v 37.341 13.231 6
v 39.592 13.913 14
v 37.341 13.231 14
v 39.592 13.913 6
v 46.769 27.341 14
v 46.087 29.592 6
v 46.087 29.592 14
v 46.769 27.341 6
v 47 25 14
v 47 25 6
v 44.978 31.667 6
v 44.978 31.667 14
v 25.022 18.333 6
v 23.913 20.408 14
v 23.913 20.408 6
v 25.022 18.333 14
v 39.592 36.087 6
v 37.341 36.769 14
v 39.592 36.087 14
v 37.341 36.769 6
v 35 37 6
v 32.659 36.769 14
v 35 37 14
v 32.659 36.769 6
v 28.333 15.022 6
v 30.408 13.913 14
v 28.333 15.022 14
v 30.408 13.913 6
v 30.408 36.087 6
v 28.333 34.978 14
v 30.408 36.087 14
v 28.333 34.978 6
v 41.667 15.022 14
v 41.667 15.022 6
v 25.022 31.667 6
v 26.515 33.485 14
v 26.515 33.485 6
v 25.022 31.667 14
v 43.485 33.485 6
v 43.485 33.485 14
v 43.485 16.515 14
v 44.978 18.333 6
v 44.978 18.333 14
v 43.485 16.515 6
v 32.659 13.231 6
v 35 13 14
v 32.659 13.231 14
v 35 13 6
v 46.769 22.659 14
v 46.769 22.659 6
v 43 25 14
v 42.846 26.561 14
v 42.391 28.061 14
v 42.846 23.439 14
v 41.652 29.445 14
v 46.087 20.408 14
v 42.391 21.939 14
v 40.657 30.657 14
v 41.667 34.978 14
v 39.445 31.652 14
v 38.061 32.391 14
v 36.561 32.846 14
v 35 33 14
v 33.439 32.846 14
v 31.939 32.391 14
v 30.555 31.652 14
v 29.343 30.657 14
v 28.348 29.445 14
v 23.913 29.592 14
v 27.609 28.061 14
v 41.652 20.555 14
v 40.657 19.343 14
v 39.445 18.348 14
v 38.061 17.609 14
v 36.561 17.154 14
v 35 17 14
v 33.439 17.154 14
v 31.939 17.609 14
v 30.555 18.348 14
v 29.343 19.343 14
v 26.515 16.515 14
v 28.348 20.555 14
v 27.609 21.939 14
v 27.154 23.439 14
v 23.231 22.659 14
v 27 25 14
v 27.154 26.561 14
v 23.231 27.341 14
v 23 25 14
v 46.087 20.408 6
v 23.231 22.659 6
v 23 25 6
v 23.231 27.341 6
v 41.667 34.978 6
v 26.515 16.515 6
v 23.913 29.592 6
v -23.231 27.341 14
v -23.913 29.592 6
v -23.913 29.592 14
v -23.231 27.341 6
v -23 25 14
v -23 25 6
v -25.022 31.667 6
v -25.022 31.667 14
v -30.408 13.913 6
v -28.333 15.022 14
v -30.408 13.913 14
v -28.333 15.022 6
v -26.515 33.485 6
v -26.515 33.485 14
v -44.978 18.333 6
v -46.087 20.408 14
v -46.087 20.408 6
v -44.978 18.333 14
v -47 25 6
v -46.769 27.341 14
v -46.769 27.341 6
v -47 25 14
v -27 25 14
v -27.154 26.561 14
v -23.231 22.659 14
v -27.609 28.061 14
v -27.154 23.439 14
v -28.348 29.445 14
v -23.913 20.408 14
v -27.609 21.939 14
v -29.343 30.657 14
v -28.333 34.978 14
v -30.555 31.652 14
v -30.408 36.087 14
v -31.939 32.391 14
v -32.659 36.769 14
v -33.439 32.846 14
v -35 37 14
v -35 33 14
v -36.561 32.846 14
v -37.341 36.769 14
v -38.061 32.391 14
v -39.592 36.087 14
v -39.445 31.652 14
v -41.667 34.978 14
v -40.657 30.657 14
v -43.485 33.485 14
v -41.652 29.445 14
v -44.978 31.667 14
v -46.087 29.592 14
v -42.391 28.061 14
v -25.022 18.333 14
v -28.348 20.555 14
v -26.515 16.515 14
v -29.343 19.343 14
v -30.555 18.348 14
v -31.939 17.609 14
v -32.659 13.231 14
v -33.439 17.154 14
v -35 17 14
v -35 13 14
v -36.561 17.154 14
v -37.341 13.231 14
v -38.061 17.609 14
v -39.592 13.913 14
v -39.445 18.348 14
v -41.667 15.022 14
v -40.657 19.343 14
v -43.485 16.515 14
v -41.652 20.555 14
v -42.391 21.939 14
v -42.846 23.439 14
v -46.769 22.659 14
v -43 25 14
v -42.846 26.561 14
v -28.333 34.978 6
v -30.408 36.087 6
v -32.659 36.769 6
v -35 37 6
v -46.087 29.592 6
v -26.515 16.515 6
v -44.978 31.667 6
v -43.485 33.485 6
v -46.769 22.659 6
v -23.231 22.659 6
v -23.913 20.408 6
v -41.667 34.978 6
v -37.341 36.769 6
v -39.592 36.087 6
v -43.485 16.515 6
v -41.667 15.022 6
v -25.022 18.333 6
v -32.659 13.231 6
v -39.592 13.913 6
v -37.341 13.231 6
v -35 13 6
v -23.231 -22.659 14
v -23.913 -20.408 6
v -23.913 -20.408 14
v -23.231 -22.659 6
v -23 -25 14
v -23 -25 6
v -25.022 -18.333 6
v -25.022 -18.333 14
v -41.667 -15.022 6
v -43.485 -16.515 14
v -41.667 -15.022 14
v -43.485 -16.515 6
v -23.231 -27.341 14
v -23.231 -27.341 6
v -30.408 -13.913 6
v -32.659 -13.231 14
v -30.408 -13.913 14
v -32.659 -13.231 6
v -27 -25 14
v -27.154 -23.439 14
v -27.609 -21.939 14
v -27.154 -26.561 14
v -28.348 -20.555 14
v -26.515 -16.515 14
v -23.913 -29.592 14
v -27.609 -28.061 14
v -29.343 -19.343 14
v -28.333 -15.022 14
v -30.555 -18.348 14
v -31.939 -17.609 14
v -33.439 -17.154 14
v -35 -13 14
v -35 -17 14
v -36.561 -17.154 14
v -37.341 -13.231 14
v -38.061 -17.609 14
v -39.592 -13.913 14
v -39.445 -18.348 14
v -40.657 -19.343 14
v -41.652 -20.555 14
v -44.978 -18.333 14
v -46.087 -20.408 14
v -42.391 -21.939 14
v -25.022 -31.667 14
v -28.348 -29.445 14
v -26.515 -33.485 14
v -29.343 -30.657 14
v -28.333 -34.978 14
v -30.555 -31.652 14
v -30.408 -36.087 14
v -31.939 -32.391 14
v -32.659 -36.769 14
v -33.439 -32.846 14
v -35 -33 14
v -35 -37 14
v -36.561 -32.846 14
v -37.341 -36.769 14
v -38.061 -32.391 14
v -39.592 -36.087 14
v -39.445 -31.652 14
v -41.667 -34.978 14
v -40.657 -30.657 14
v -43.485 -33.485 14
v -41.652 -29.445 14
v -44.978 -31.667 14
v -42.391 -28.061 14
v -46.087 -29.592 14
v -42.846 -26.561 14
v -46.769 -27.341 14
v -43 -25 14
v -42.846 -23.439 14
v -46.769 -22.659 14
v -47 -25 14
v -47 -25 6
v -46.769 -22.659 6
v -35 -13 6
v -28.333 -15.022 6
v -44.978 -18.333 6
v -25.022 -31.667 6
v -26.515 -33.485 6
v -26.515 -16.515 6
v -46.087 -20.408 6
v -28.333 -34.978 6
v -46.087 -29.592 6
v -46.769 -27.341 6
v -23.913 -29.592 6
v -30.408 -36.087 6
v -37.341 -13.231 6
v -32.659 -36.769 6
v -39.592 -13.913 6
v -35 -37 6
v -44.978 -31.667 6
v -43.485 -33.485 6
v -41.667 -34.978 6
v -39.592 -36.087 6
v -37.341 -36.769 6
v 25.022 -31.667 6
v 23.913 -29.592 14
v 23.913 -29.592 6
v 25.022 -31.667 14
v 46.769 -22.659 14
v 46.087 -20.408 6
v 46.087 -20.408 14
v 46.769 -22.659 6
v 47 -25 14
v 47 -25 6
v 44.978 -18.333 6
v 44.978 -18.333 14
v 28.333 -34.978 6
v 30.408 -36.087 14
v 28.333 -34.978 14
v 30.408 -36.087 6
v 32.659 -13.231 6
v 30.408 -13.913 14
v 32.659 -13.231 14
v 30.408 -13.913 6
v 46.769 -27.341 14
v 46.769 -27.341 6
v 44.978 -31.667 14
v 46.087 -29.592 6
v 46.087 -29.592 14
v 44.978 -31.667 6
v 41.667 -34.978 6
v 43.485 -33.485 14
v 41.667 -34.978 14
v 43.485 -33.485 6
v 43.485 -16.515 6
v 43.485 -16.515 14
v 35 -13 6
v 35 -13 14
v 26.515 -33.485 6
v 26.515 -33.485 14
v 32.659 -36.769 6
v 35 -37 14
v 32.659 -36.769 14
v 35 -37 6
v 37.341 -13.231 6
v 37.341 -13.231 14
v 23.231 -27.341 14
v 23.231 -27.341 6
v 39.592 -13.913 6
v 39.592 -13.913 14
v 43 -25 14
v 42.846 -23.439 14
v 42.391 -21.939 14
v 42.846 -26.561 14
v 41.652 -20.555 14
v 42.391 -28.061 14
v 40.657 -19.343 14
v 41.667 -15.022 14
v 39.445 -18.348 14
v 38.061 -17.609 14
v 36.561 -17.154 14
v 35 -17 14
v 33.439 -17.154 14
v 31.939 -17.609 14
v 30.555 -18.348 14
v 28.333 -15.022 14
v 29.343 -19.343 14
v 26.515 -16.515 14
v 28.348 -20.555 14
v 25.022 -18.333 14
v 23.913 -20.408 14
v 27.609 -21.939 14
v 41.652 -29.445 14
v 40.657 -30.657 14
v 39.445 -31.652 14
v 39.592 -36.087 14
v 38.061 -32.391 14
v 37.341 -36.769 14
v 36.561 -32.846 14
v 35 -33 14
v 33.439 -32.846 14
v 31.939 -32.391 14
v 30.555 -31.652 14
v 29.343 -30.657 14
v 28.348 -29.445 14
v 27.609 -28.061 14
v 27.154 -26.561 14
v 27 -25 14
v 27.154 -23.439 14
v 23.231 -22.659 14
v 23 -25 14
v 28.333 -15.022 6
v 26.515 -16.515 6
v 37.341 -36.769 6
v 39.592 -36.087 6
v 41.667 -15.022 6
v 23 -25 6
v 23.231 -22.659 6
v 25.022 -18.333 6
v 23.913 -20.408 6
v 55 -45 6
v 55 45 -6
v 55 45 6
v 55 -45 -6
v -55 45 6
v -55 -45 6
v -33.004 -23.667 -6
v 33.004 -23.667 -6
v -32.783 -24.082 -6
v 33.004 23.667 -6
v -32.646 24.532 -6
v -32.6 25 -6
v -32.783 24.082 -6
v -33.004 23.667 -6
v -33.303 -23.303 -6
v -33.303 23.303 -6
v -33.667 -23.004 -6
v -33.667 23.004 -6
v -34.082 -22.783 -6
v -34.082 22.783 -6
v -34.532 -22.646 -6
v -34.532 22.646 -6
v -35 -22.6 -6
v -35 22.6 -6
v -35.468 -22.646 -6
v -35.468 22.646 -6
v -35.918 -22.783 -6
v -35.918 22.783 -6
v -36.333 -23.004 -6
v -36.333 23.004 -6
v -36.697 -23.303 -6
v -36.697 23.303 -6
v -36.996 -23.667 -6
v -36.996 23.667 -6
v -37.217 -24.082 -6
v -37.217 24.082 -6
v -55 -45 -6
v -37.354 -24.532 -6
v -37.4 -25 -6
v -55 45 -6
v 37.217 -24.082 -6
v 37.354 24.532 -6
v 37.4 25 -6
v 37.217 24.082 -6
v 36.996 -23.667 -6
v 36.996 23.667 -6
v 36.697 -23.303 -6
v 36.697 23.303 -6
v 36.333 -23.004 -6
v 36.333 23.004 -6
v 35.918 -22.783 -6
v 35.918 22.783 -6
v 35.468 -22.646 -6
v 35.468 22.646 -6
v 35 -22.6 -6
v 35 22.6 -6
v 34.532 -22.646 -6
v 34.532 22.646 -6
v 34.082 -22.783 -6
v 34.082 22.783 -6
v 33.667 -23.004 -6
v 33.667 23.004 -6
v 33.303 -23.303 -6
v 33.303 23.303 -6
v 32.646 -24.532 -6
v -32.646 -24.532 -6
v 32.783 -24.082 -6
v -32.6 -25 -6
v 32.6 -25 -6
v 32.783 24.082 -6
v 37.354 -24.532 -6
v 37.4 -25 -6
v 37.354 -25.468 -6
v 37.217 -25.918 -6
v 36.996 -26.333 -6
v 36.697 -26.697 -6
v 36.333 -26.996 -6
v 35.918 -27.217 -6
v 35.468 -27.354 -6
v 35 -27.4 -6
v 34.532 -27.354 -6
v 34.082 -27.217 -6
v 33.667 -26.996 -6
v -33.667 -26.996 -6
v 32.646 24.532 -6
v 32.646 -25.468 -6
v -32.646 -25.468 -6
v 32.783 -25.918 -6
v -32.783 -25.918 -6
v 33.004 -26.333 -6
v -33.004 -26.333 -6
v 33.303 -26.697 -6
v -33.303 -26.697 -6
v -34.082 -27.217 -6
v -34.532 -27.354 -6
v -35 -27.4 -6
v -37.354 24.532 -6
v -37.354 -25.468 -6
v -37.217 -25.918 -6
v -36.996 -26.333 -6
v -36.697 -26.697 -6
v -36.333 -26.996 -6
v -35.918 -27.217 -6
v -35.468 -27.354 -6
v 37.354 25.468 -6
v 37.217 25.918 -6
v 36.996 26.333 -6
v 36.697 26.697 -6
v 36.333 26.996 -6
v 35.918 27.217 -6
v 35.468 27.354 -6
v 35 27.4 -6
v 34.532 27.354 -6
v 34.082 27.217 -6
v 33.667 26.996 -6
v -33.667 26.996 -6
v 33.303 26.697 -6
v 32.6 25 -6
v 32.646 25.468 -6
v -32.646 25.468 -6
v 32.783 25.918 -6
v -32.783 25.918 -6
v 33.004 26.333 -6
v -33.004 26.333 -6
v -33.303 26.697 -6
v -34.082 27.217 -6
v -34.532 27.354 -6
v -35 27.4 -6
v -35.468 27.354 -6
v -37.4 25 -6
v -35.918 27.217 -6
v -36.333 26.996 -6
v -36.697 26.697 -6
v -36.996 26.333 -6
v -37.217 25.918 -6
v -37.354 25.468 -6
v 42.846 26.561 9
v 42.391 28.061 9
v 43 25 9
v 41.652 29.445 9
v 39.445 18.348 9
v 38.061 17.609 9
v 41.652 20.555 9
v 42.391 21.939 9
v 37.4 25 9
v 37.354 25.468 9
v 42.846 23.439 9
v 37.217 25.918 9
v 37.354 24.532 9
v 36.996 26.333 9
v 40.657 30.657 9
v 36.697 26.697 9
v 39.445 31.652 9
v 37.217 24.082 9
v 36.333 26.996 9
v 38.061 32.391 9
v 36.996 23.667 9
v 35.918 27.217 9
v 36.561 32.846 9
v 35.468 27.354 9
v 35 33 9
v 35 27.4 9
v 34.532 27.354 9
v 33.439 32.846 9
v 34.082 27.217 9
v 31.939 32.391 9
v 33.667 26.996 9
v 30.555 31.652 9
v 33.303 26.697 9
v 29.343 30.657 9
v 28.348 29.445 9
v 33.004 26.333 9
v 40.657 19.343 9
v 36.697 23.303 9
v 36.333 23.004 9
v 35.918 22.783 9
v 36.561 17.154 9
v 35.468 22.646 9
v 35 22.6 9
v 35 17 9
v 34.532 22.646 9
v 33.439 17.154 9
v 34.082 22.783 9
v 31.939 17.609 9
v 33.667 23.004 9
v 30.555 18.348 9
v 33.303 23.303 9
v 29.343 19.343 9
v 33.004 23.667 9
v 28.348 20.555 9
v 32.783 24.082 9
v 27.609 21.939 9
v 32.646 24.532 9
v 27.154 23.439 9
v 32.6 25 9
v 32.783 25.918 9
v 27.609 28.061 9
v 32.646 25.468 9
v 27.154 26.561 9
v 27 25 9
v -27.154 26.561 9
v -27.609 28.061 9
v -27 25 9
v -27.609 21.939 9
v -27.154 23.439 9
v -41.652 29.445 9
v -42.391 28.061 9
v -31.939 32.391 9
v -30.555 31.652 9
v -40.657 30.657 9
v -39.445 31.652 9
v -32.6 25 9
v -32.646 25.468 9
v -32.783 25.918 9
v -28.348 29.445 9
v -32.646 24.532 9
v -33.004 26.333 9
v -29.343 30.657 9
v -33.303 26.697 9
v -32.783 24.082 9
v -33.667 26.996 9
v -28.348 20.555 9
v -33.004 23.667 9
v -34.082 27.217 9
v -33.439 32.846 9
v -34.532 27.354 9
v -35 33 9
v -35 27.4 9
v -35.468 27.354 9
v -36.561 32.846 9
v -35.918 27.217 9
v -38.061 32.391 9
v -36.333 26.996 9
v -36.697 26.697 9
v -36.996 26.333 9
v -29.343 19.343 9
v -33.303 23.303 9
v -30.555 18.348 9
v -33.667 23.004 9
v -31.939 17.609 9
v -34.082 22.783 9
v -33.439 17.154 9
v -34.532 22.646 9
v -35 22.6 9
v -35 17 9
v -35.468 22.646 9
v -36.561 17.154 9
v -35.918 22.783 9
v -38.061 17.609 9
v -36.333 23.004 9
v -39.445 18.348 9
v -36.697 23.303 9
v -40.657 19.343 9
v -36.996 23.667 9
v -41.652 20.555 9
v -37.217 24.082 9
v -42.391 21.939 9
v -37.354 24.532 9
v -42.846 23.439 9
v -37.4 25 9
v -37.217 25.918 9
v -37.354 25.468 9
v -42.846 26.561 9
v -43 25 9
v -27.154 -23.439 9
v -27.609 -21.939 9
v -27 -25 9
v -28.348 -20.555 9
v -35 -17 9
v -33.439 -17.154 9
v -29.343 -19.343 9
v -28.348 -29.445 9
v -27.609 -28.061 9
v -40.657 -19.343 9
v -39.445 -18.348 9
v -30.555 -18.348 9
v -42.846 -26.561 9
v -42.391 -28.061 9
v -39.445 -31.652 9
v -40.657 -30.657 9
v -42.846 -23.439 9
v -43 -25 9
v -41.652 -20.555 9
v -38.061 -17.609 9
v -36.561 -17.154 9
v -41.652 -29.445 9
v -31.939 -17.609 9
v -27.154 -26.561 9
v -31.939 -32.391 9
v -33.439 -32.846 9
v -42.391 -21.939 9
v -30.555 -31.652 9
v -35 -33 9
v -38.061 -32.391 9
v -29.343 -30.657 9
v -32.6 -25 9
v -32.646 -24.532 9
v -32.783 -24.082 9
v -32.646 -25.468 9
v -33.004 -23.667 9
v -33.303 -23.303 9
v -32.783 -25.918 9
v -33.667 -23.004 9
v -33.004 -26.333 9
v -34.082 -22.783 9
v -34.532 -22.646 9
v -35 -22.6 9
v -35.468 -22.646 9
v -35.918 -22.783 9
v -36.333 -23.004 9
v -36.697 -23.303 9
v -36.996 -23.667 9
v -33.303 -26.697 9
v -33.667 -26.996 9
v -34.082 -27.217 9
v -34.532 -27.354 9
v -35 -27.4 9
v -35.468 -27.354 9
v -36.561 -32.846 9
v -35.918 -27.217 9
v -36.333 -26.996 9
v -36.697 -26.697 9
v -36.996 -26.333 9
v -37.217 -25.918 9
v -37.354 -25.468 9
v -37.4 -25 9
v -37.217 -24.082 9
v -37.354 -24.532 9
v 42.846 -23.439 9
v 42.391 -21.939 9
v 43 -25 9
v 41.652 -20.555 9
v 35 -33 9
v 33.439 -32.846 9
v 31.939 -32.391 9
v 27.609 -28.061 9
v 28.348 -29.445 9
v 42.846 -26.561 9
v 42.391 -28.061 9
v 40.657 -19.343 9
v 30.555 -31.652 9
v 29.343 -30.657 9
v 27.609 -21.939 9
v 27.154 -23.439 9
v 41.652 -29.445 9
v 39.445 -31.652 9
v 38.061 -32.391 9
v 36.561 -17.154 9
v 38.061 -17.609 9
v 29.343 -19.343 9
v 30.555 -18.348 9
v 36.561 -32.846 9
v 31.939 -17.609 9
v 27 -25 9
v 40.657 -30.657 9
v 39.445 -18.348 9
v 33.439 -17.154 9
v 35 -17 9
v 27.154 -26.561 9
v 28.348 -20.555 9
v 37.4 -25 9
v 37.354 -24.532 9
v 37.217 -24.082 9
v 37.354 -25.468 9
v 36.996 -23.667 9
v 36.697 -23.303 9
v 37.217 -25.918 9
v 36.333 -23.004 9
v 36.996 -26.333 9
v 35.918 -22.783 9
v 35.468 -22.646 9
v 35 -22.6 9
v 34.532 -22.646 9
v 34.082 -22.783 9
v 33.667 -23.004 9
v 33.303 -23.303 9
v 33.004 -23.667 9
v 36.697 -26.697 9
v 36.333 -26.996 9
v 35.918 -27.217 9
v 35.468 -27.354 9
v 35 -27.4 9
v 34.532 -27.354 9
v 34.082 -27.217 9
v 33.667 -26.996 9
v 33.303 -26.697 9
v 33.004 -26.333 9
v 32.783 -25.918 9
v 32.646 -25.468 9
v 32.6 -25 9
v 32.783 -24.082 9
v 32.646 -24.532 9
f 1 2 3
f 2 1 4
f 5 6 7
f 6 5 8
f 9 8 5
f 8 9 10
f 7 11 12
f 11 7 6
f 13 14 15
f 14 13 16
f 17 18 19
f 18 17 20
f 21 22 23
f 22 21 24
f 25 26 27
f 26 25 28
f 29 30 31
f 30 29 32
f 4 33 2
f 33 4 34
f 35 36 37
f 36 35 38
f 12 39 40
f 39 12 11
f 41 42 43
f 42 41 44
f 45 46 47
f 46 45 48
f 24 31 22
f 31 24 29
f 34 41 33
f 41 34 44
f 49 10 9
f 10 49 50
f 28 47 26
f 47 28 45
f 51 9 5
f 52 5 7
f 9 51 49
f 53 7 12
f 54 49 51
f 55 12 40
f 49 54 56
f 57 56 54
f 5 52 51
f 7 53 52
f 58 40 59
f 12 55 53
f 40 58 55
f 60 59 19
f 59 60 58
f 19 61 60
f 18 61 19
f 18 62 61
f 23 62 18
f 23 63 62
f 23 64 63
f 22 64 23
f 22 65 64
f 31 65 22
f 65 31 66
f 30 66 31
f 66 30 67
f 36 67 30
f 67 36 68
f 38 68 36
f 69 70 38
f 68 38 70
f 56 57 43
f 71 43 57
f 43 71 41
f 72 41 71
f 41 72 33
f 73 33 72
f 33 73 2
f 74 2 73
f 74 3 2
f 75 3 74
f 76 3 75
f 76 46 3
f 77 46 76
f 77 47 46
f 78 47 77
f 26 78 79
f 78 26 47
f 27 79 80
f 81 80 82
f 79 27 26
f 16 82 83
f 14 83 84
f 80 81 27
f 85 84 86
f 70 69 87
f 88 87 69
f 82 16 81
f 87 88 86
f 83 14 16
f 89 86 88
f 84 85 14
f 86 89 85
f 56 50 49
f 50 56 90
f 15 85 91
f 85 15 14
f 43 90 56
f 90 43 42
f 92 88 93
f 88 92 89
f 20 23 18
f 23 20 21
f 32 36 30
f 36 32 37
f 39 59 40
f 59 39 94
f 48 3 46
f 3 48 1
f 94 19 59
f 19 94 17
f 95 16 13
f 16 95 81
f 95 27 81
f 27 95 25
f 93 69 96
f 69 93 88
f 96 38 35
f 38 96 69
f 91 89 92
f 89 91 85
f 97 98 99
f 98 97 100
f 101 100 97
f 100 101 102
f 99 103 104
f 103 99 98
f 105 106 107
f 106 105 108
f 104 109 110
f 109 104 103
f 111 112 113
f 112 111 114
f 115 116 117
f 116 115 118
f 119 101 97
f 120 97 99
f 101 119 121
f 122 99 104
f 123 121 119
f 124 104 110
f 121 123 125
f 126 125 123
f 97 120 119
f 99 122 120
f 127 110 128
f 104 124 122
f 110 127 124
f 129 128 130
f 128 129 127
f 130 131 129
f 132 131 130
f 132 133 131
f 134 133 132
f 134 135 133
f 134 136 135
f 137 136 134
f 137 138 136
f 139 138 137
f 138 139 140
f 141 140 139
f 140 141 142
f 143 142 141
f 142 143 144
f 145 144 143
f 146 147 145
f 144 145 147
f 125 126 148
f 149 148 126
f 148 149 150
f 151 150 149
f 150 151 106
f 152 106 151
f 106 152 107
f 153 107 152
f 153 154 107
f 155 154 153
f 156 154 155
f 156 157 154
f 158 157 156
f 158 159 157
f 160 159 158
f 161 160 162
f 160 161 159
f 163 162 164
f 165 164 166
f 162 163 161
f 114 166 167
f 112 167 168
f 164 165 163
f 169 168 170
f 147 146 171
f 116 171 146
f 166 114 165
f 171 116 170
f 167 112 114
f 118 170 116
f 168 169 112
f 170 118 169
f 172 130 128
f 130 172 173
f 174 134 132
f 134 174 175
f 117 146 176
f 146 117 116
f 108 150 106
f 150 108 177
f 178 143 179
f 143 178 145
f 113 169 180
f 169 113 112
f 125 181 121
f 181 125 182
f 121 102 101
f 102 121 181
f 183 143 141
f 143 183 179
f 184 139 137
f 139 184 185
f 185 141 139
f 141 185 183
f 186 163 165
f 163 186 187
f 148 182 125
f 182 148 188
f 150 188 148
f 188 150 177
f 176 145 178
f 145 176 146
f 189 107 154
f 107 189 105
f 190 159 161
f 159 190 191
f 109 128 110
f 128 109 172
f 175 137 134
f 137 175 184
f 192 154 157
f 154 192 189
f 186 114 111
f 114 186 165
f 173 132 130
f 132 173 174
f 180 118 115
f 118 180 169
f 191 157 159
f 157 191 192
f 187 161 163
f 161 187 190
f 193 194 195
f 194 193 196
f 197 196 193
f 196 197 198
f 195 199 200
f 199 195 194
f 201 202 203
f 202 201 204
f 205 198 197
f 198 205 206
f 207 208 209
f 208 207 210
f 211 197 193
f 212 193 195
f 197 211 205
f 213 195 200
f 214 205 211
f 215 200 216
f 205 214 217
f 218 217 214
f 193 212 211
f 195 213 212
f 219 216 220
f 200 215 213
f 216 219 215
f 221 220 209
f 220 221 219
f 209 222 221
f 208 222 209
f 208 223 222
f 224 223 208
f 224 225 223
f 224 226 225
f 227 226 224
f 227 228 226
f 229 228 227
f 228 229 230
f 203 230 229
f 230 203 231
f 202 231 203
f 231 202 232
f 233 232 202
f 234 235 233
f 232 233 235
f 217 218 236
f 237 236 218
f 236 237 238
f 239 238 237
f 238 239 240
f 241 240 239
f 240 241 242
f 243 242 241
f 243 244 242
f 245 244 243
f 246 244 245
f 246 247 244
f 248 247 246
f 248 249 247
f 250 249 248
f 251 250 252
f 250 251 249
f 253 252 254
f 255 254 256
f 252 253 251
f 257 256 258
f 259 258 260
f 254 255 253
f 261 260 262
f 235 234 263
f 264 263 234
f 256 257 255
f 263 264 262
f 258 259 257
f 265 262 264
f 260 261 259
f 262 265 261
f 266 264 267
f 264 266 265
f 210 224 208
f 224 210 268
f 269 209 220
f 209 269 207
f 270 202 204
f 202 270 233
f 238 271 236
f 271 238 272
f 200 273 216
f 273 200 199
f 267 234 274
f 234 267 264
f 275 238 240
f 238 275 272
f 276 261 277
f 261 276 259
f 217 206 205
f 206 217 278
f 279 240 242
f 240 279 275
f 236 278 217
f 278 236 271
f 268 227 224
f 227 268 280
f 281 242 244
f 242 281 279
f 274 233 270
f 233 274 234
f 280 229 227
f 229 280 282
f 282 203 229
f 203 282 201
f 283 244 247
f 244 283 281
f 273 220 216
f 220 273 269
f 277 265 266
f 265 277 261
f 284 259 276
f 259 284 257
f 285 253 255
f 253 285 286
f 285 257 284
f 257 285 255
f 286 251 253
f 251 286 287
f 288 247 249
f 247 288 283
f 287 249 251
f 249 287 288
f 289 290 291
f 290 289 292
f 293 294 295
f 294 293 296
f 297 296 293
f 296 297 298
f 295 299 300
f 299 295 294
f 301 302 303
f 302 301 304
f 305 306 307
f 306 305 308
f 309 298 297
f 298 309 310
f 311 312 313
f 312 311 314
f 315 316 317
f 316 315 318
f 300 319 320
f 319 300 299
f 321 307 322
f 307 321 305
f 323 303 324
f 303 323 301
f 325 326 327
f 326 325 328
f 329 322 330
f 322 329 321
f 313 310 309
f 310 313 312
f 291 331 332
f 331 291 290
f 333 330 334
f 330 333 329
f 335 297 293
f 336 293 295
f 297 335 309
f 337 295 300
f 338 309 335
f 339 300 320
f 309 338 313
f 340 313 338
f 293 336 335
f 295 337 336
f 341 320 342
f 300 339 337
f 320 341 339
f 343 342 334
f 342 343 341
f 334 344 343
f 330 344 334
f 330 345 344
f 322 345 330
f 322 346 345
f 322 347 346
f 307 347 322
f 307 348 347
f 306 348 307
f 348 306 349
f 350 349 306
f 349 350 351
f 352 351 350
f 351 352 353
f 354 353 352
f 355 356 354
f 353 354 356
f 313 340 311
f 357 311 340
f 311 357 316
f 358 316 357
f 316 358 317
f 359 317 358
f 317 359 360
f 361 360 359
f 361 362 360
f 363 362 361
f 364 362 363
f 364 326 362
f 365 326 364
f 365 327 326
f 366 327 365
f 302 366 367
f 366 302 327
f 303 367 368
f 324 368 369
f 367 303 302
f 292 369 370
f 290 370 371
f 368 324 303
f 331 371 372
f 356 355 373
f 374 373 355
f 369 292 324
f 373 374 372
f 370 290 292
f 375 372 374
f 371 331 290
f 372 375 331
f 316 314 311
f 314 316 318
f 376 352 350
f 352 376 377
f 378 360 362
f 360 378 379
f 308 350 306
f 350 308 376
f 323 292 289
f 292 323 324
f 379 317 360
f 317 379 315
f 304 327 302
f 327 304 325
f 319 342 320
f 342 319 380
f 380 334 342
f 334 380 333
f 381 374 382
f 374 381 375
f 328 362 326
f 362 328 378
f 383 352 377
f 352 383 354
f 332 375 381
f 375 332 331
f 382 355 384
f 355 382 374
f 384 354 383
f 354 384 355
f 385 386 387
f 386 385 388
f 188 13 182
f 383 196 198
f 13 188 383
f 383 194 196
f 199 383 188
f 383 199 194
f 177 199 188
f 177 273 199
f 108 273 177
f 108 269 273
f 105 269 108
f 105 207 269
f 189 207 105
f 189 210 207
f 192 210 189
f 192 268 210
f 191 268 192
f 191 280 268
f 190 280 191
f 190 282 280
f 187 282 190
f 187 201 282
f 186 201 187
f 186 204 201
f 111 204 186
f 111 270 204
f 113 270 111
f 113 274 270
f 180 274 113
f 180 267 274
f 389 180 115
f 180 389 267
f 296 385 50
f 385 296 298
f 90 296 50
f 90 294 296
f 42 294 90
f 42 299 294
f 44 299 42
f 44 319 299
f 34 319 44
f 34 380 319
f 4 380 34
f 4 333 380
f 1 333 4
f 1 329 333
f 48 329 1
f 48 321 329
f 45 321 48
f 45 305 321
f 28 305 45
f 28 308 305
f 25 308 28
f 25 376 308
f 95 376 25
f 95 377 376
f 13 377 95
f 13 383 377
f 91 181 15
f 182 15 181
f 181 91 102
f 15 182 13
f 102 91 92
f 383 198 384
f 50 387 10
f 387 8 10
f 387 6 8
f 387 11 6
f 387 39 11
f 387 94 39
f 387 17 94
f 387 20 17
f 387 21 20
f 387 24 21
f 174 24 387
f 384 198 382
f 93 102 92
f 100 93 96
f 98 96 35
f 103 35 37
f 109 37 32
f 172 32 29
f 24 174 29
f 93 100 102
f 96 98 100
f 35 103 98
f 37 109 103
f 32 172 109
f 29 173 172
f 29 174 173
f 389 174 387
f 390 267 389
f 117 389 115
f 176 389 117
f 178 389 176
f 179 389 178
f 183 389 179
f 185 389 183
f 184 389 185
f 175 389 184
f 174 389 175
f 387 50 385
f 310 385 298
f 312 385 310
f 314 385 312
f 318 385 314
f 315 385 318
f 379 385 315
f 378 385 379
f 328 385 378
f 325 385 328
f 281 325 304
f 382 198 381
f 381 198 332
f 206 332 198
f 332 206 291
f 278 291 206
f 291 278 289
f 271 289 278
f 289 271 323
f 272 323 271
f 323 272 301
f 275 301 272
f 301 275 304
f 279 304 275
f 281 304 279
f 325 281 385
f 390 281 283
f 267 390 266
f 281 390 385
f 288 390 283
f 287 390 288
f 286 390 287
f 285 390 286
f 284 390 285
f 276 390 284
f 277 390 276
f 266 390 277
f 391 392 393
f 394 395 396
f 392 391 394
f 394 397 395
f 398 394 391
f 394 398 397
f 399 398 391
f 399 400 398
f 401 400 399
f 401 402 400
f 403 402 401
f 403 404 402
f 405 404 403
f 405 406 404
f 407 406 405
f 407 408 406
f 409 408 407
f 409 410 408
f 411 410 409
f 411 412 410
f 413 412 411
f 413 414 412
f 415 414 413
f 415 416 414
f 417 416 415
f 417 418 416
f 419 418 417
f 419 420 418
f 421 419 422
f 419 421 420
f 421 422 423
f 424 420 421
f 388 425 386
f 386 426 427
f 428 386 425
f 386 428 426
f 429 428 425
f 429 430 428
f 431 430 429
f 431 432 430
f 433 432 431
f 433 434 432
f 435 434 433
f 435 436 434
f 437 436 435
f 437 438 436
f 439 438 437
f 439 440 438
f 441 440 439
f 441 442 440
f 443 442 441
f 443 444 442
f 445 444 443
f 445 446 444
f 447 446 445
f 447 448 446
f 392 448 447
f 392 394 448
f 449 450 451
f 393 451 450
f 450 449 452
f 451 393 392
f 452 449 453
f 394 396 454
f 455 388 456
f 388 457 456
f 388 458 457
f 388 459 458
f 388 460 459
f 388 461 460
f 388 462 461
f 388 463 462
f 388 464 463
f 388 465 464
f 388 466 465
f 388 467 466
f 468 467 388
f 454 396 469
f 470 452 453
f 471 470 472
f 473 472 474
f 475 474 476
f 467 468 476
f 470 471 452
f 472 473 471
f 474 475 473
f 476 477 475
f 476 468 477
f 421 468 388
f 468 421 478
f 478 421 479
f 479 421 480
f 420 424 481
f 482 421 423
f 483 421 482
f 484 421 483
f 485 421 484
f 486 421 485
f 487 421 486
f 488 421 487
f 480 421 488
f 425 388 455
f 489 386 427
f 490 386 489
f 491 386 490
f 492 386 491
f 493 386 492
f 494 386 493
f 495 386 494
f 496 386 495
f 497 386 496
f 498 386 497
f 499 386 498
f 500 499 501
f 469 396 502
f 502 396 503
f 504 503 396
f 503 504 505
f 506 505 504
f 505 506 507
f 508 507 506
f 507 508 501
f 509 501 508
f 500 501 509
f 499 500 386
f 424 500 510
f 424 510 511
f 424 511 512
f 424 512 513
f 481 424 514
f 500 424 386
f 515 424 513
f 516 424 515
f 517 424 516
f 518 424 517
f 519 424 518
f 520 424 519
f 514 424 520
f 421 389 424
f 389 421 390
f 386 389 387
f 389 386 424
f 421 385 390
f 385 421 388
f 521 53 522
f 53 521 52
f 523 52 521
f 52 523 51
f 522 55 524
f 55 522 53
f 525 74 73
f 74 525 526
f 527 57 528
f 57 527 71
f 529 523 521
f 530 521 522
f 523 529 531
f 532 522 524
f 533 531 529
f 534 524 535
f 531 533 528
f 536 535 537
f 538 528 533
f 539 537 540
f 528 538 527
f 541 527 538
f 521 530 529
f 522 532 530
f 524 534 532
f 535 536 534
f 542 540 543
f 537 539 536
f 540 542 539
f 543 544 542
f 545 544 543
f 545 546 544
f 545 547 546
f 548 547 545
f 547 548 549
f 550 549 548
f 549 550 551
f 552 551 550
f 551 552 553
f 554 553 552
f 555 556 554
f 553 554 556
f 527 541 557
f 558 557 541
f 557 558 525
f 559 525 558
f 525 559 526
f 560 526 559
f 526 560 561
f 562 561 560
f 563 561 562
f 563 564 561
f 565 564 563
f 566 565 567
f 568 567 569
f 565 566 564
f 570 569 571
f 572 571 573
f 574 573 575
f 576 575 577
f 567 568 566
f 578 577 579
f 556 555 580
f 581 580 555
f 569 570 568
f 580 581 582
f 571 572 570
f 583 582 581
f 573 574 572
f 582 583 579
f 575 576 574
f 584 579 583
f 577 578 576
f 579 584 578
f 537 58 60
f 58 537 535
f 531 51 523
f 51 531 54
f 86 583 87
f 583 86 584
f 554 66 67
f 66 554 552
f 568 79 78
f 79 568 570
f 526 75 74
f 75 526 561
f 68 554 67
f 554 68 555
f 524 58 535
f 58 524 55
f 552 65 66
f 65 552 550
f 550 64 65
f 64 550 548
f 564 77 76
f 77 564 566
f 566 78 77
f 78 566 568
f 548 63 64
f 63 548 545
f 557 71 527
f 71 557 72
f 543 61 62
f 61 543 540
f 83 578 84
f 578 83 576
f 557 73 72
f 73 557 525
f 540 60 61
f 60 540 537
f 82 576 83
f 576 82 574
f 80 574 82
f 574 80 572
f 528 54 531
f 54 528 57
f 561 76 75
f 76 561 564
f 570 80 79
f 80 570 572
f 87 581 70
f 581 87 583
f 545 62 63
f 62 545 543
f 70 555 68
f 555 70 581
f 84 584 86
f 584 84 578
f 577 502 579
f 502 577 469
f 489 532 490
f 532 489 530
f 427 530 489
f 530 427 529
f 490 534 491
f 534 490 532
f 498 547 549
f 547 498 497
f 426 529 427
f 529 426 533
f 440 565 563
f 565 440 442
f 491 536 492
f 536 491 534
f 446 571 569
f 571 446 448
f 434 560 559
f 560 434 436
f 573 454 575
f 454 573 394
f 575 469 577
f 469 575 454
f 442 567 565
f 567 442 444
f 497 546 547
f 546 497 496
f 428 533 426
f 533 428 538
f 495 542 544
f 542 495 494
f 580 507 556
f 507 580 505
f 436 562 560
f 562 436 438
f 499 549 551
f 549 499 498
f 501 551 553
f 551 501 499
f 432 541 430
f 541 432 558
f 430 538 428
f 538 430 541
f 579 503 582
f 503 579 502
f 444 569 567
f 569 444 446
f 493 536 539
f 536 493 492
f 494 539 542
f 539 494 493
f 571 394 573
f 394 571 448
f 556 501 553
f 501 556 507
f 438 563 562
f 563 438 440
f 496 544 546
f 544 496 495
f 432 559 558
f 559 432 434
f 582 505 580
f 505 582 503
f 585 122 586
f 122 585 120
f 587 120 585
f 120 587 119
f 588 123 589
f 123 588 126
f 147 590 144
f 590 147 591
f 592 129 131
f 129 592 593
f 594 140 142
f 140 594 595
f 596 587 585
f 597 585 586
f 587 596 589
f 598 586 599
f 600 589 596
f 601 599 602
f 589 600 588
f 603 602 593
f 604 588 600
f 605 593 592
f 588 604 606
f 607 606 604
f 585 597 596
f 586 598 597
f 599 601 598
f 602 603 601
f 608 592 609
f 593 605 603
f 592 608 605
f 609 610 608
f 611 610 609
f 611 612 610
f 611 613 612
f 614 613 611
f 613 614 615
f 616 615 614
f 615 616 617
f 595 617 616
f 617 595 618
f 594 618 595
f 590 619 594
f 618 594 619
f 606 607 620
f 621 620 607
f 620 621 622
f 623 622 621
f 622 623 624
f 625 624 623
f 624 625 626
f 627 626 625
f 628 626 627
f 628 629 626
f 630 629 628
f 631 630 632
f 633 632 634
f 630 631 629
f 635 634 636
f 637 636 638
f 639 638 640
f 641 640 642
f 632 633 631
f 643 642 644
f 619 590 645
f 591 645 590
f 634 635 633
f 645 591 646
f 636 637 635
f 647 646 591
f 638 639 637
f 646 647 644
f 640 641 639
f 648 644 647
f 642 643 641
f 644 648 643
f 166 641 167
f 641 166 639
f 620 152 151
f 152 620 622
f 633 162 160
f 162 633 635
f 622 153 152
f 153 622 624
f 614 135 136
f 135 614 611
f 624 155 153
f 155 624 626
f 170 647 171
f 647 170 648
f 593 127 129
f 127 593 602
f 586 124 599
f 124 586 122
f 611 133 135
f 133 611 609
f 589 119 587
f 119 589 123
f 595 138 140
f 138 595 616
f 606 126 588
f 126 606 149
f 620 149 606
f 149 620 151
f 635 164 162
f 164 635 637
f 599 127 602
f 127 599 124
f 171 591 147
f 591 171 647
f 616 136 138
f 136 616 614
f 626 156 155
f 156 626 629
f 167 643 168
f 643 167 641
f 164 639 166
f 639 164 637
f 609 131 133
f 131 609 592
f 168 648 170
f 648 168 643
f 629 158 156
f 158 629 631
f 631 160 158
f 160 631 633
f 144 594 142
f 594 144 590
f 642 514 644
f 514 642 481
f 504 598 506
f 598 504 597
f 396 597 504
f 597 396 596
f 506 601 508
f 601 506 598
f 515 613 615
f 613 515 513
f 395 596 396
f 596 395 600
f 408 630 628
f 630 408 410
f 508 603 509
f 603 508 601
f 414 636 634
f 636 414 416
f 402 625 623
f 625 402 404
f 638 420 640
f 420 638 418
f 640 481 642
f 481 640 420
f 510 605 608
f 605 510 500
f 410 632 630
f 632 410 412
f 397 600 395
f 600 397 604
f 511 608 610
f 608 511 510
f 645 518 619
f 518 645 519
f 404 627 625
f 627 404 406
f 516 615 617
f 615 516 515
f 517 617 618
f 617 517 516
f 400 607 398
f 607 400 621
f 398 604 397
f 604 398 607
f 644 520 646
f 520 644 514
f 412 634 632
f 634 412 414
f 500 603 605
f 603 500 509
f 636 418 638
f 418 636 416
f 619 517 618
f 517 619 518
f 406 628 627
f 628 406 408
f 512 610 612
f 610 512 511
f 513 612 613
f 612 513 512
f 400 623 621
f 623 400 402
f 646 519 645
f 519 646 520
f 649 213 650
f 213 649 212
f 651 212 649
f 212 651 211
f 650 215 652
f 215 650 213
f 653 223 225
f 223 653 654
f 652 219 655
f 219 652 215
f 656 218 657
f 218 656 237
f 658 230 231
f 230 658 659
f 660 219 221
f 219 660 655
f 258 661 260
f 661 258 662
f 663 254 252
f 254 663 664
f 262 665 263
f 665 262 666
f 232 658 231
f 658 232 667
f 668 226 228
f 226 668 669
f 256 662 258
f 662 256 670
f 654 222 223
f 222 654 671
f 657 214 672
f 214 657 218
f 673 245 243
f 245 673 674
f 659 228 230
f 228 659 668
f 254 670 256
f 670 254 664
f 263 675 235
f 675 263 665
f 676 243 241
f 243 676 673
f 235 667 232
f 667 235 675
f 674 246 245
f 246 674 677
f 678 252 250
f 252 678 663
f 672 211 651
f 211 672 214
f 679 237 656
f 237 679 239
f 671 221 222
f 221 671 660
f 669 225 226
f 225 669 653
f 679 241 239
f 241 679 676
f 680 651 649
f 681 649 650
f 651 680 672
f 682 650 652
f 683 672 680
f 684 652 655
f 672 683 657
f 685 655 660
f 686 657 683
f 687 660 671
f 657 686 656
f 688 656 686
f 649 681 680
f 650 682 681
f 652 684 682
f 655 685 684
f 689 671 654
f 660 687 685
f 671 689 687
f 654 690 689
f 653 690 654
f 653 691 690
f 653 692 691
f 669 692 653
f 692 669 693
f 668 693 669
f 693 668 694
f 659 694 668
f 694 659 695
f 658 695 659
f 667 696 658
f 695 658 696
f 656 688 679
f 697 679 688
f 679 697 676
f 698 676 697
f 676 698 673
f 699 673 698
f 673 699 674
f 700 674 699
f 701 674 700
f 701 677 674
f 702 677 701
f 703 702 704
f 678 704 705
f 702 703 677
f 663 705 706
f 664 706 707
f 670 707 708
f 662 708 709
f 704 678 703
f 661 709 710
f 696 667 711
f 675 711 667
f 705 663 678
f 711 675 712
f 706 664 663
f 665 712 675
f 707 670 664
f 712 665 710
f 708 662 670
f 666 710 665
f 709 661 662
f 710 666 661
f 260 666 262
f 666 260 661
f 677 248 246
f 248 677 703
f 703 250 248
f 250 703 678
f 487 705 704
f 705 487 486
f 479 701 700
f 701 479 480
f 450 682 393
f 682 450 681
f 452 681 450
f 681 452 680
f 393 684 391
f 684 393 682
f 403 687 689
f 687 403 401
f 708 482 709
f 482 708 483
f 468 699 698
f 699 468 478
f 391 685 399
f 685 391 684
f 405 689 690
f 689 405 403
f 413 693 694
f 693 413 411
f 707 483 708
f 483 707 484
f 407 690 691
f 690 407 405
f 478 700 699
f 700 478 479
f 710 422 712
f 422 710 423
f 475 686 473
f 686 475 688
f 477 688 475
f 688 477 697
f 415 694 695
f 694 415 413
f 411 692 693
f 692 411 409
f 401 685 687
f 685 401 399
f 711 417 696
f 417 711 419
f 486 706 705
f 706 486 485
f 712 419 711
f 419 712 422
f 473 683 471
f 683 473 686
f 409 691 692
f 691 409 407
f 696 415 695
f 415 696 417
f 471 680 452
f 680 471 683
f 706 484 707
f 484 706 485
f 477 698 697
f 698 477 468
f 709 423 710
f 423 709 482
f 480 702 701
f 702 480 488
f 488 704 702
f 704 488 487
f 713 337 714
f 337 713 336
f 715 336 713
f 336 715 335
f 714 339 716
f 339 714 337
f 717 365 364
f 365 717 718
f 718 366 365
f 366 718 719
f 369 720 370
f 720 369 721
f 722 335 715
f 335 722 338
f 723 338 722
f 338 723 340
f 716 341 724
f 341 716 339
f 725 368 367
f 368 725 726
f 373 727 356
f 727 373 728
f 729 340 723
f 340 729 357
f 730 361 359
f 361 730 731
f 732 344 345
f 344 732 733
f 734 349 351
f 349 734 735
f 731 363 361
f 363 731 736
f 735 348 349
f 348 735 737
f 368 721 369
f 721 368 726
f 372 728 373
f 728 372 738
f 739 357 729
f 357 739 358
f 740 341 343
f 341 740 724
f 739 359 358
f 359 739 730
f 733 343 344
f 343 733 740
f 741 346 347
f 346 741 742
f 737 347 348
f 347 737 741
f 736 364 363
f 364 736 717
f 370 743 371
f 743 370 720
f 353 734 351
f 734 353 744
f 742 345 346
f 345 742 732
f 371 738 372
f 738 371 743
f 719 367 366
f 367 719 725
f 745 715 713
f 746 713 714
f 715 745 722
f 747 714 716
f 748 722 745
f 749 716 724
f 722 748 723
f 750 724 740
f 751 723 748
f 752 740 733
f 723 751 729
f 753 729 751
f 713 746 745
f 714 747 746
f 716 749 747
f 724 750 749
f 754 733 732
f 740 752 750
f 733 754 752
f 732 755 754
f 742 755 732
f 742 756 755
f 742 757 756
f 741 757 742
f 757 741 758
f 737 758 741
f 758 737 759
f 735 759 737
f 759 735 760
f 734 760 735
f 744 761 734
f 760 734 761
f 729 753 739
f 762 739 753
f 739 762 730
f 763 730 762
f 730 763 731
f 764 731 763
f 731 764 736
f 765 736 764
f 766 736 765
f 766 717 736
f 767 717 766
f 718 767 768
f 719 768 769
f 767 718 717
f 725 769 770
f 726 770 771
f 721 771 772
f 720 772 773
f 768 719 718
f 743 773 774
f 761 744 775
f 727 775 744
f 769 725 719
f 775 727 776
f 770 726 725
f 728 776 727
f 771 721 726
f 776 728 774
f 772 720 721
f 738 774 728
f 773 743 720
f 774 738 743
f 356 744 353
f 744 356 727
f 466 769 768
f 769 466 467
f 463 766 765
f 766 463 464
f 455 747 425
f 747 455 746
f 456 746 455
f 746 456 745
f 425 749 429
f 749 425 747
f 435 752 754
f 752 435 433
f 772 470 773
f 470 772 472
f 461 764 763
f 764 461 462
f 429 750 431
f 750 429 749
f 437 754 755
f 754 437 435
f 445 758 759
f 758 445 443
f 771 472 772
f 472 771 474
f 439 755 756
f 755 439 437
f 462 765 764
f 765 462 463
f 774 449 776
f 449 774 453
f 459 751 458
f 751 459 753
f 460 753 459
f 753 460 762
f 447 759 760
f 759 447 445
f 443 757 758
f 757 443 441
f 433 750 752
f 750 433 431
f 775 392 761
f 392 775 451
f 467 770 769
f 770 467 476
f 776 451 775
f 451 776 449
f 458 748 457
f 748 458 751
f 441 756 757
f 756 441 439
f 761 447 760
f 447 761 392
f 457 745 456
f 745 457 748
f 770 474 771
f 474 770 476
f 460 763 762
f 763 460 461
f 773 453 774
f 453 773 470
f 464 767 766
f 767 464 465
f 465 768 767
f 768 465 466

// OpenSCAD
$fn = 32;

// ----------------------------------------------------------------------
// Socket pad plate
// bosses with counterbored sockets for the screws
// ----------------------------------------------------------------------

// --- parameters (mm) ---
base_t = 12;            // base plate thickness
boss_h = 8;             // boss height above the base plate
boss_d = 24;            // boss diameter
socket_d = 16;          // socket diameter
socket_depth = 5;       // socket depth from the boss face
bolt_d = 4.8;           // screw clearance hole through the socket floor
plate = [110, 90, 12];  // overall size (x, y, z)
edge = 20;              // boss centre offset from the plate edge
pads = 4;               // boss count, one per corner

// --- derived feature positions (mm) ---
height = base_t + boss_h;        // = 20   overall height of the part
corner_x = plate[0] / 2 - edge;  // = 35   boss centre X
corner_y = plate[1] / 2 - edge;  // = 25   boss centre Y
feature_centers = [
  [corner_x, corner_y],
  [-corner_x, corner_y],
  [-corner_x, -corner_y],
  [corner_x, -corner_y]
];   // boss centres: sockets, holes and the pads themselves are placed from here

// base plate, bosses on feature_centers, socket + through hole in each
difference() {
  union() {
    cube(plate, center = true);
    for (centre = feature_centers)
      translate([centre[0], centre[1], plate[2] / 2 - 1])
        cylinder(d = boss_d, h = boss_h + 1);
  }
  for (centre = feature_centers) {
    translate([centre[0], centre[1], plate[2] / 2 + boss_h - socket_depth])
      cylinder(d = socket_d, h = socket_depth + 1);
    translate([centre[0], centre[1], -height])
      cylinder(d = bolt_d, h = 2 * height + 2);  // through the socket floor
  }
}
